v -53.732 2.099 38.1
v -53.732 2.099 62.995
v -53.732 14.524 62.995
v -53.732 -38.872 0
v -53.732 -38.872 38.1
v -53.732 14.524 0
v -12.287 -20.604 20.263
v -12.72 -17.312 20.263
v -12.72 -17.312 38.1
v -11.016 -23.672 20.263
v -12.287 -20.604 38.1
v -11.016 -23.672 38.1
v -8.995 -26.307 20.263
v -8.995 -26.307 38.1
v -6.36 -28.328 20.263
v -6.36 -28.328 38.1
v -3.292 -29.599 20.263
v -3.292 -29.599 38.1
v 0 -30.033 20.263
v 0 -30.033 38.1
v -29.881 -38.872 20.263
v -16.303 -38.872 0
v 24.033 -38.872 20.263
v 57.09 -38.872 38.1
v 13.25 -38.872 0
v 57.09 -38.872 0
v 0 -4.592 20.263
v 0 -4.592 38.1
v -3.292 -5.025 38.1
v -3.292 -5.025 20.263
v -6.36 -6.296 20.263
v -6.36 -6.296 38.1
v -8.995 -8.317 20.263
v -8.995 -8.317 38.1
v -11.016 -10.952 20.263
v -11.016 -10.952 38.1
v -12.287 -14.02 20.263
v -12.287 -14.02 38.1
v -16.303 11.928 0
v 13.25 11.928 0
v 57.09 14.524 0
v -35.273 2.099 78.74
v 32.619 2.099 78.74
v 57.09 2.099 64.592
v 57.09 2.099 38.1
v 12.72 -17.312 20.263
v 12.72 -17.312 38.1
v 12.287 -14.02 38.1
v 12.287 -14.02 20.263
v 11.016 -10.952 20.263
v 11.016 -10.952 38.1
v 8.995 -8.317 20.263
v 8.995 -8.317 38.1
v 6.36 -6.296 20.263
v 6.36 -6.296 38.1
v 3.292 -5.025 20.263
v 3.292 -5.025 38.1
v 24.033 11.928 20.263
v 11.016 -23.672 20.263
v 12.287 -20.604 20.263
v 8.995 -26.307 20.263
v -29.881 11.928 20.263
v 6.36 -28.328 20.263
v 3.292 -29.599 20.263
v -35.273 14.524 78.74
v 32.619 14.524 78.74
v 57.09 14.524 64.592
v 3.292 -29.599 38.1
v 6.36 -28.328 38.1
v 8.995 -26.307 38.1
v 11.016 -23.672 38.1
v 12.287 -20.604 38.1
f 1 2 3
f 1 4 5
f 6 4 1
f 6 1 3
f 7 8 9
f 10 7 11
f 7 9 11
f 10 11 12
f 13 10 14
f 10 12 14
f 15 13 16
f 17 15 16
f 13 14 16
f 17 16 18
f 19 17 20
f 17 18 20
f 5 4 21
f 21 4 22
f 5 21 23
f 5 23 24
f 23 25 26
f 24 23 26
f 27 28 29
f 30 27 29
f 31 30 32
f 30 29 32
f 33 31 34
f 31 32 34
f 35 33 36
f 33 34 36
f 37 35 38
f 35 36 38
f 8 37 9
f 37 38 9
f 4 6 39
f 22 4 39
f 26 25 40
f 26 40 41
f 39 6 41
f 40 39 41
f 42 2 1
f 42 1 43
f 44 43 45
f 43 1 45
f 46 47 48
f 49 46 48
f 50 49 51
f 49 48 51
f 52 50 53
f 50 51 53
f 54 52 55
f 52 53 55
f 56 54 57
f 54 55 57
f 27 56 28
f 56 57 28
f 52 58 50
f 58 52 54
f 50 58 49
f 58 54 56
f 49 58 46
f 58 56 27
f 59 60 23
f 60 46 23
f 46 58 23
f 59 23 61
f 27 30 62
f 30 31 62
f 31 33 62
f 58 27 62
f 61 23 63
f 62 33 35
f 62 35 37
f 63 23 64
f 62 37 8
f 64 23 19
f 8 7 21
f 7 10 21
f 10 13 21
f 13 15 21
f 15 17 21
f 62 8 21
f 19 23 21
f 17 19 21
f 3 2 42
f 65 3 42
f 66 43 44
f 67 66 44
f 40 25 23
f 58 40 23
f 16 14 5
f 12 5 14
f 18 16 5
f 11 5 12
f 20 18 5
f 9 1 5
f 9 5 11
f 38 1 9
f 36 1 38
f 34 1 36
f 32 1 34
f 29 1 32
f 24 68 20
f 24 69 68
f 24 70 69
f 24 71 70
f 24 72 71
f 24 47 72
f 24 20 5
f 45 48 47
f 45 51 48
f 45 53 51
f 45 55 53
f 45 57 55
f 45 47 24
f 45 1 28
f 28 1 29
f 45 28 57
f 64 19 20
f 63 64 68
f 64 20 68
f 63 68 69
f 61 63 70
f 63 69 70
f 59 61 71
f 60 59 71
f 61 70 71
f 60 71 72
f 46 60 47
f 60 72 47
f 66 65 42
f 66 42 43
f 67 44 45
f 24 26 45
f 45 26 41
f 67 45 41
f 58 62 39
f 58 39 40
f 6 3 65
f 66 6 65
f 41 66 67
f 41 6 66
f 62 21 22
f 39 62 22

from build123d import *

# Parameters (mm, degrees)
F0_W      = 110.8218282461
F0_H      = 53.3959735185
F1_DEPTH  = 38.1
F2_W      = 110.8218282461
F2_H      = 12.4254778493
F3_DEPTH  = 40.64
F5_DEPTH  = 25.4
F7_DEPTH  = 25.4
F8_DEPTH  = 25.4
F10_DEPTH = 25.4


with BuildPart() as f1:
    # F0 (on Top) → F1 (new body)
    with BuildSketch(Plane.XY):
        with Locations((1.6791187227, -12.1736107394)):
            Rectangle(F0_W, F0_H)
    extrude(amount=F1_DEPTH)

    # F2 (on face) → F3 (join)
    with BuildSketch(Plane.XY.offset(38.1)):
        with Locations((1.6791187227, 8.3116370952)):
            Rectangle(F2_W, F2_H)
    extrude(amount=F3_DEPTH)

    # F4 (on face) → F5 (cut)
    with BuildSketch(Plane.XZ.offset(-2.0988981705)):
        Polygon((-53.7317954004, 62.9949569702), (-35.2727063, 78.74), (-53.7317954004, 78.74), align=None)
        Polygon((57.0900328457, 78.74), (32.6191671193, 78.74), (57.0900328457, 64.5924061537), align=None)
    extrude(amount=-F5_DEPTH, mode=Mode.SUBTRACT)

    # F6 (on face) → F7 (cut)
    with BuildSketch(Plane.XZ.offset(38.8715974987)):
        Polygon((-29.8812910914, 20.2630087733), (-16.3029171526, 0), (13.250015676, 0), (24.0328423679, 20.2630087733), align=None)
    extrude(amount=-F7_DEPTH, mode=Mode.SUBTRACT)

    # F8 (cut): a face of the model
    f8_faces = [f1.faces().sort_by_distance(p)[0] for p in [
        (-2.2933313213, -13.4715974987, 11.1171850151),
    ]]
    extrude(f8_faces, amount=-F8_DEPTH, mode=Mode.SUBTRACT)

    # F9 (on face) → F10 (cut)
    with BuildSketch(Plane.XY.offset(38.1)):
        with BuildLine():
            Line((-12.7204942497, -17.3120461404), (0, -17.3120461404))
            Line((0, -17.3120461404), (0, -4.5915518908))
            ThreePointArc((0, -4.5915518908), (-8.994747744, -8.3172983965), (-12.7204942497, -17.3120461404))
        make_face()
        with BuildLine():
            Line((0, -4.5915518908), (0, -17.3120461404))
            Line((0, -17.3120461404), (12.7204942497, -17.3120461404))
            ThreePointArc((12.7204942497, -17.3120461404), (8.994747744, -8.3172983965), (0, -4.5915518908))
        make_face()
        with BuildLine():
            Line((0, -30.0325403901), (0, -17.3120461404))
            Line((0, -17.3120461404), (-12.7204942497, -17.3120461404))
            ThreePointArc((-12.7204942497, -17.3120461404), (-8.994747744, -26.3067938844), (0, -30.0325403901))
        make_face()
        with BuildLine():
            Line((12.7204942497, -17.3120461404), (0, -17.3120461404))
            Line((0, -17.3120461404), (0, -30.0325403901))
            ThreePointArc((0, -30.0325403901), (8.994747744, -26.3067938844), (12.7204942497, -17.3120461404))
        make_face()
    extrude(amount=-F10_DEPTH, mode=Mode.SUBTRACT)


solid = f1.part
